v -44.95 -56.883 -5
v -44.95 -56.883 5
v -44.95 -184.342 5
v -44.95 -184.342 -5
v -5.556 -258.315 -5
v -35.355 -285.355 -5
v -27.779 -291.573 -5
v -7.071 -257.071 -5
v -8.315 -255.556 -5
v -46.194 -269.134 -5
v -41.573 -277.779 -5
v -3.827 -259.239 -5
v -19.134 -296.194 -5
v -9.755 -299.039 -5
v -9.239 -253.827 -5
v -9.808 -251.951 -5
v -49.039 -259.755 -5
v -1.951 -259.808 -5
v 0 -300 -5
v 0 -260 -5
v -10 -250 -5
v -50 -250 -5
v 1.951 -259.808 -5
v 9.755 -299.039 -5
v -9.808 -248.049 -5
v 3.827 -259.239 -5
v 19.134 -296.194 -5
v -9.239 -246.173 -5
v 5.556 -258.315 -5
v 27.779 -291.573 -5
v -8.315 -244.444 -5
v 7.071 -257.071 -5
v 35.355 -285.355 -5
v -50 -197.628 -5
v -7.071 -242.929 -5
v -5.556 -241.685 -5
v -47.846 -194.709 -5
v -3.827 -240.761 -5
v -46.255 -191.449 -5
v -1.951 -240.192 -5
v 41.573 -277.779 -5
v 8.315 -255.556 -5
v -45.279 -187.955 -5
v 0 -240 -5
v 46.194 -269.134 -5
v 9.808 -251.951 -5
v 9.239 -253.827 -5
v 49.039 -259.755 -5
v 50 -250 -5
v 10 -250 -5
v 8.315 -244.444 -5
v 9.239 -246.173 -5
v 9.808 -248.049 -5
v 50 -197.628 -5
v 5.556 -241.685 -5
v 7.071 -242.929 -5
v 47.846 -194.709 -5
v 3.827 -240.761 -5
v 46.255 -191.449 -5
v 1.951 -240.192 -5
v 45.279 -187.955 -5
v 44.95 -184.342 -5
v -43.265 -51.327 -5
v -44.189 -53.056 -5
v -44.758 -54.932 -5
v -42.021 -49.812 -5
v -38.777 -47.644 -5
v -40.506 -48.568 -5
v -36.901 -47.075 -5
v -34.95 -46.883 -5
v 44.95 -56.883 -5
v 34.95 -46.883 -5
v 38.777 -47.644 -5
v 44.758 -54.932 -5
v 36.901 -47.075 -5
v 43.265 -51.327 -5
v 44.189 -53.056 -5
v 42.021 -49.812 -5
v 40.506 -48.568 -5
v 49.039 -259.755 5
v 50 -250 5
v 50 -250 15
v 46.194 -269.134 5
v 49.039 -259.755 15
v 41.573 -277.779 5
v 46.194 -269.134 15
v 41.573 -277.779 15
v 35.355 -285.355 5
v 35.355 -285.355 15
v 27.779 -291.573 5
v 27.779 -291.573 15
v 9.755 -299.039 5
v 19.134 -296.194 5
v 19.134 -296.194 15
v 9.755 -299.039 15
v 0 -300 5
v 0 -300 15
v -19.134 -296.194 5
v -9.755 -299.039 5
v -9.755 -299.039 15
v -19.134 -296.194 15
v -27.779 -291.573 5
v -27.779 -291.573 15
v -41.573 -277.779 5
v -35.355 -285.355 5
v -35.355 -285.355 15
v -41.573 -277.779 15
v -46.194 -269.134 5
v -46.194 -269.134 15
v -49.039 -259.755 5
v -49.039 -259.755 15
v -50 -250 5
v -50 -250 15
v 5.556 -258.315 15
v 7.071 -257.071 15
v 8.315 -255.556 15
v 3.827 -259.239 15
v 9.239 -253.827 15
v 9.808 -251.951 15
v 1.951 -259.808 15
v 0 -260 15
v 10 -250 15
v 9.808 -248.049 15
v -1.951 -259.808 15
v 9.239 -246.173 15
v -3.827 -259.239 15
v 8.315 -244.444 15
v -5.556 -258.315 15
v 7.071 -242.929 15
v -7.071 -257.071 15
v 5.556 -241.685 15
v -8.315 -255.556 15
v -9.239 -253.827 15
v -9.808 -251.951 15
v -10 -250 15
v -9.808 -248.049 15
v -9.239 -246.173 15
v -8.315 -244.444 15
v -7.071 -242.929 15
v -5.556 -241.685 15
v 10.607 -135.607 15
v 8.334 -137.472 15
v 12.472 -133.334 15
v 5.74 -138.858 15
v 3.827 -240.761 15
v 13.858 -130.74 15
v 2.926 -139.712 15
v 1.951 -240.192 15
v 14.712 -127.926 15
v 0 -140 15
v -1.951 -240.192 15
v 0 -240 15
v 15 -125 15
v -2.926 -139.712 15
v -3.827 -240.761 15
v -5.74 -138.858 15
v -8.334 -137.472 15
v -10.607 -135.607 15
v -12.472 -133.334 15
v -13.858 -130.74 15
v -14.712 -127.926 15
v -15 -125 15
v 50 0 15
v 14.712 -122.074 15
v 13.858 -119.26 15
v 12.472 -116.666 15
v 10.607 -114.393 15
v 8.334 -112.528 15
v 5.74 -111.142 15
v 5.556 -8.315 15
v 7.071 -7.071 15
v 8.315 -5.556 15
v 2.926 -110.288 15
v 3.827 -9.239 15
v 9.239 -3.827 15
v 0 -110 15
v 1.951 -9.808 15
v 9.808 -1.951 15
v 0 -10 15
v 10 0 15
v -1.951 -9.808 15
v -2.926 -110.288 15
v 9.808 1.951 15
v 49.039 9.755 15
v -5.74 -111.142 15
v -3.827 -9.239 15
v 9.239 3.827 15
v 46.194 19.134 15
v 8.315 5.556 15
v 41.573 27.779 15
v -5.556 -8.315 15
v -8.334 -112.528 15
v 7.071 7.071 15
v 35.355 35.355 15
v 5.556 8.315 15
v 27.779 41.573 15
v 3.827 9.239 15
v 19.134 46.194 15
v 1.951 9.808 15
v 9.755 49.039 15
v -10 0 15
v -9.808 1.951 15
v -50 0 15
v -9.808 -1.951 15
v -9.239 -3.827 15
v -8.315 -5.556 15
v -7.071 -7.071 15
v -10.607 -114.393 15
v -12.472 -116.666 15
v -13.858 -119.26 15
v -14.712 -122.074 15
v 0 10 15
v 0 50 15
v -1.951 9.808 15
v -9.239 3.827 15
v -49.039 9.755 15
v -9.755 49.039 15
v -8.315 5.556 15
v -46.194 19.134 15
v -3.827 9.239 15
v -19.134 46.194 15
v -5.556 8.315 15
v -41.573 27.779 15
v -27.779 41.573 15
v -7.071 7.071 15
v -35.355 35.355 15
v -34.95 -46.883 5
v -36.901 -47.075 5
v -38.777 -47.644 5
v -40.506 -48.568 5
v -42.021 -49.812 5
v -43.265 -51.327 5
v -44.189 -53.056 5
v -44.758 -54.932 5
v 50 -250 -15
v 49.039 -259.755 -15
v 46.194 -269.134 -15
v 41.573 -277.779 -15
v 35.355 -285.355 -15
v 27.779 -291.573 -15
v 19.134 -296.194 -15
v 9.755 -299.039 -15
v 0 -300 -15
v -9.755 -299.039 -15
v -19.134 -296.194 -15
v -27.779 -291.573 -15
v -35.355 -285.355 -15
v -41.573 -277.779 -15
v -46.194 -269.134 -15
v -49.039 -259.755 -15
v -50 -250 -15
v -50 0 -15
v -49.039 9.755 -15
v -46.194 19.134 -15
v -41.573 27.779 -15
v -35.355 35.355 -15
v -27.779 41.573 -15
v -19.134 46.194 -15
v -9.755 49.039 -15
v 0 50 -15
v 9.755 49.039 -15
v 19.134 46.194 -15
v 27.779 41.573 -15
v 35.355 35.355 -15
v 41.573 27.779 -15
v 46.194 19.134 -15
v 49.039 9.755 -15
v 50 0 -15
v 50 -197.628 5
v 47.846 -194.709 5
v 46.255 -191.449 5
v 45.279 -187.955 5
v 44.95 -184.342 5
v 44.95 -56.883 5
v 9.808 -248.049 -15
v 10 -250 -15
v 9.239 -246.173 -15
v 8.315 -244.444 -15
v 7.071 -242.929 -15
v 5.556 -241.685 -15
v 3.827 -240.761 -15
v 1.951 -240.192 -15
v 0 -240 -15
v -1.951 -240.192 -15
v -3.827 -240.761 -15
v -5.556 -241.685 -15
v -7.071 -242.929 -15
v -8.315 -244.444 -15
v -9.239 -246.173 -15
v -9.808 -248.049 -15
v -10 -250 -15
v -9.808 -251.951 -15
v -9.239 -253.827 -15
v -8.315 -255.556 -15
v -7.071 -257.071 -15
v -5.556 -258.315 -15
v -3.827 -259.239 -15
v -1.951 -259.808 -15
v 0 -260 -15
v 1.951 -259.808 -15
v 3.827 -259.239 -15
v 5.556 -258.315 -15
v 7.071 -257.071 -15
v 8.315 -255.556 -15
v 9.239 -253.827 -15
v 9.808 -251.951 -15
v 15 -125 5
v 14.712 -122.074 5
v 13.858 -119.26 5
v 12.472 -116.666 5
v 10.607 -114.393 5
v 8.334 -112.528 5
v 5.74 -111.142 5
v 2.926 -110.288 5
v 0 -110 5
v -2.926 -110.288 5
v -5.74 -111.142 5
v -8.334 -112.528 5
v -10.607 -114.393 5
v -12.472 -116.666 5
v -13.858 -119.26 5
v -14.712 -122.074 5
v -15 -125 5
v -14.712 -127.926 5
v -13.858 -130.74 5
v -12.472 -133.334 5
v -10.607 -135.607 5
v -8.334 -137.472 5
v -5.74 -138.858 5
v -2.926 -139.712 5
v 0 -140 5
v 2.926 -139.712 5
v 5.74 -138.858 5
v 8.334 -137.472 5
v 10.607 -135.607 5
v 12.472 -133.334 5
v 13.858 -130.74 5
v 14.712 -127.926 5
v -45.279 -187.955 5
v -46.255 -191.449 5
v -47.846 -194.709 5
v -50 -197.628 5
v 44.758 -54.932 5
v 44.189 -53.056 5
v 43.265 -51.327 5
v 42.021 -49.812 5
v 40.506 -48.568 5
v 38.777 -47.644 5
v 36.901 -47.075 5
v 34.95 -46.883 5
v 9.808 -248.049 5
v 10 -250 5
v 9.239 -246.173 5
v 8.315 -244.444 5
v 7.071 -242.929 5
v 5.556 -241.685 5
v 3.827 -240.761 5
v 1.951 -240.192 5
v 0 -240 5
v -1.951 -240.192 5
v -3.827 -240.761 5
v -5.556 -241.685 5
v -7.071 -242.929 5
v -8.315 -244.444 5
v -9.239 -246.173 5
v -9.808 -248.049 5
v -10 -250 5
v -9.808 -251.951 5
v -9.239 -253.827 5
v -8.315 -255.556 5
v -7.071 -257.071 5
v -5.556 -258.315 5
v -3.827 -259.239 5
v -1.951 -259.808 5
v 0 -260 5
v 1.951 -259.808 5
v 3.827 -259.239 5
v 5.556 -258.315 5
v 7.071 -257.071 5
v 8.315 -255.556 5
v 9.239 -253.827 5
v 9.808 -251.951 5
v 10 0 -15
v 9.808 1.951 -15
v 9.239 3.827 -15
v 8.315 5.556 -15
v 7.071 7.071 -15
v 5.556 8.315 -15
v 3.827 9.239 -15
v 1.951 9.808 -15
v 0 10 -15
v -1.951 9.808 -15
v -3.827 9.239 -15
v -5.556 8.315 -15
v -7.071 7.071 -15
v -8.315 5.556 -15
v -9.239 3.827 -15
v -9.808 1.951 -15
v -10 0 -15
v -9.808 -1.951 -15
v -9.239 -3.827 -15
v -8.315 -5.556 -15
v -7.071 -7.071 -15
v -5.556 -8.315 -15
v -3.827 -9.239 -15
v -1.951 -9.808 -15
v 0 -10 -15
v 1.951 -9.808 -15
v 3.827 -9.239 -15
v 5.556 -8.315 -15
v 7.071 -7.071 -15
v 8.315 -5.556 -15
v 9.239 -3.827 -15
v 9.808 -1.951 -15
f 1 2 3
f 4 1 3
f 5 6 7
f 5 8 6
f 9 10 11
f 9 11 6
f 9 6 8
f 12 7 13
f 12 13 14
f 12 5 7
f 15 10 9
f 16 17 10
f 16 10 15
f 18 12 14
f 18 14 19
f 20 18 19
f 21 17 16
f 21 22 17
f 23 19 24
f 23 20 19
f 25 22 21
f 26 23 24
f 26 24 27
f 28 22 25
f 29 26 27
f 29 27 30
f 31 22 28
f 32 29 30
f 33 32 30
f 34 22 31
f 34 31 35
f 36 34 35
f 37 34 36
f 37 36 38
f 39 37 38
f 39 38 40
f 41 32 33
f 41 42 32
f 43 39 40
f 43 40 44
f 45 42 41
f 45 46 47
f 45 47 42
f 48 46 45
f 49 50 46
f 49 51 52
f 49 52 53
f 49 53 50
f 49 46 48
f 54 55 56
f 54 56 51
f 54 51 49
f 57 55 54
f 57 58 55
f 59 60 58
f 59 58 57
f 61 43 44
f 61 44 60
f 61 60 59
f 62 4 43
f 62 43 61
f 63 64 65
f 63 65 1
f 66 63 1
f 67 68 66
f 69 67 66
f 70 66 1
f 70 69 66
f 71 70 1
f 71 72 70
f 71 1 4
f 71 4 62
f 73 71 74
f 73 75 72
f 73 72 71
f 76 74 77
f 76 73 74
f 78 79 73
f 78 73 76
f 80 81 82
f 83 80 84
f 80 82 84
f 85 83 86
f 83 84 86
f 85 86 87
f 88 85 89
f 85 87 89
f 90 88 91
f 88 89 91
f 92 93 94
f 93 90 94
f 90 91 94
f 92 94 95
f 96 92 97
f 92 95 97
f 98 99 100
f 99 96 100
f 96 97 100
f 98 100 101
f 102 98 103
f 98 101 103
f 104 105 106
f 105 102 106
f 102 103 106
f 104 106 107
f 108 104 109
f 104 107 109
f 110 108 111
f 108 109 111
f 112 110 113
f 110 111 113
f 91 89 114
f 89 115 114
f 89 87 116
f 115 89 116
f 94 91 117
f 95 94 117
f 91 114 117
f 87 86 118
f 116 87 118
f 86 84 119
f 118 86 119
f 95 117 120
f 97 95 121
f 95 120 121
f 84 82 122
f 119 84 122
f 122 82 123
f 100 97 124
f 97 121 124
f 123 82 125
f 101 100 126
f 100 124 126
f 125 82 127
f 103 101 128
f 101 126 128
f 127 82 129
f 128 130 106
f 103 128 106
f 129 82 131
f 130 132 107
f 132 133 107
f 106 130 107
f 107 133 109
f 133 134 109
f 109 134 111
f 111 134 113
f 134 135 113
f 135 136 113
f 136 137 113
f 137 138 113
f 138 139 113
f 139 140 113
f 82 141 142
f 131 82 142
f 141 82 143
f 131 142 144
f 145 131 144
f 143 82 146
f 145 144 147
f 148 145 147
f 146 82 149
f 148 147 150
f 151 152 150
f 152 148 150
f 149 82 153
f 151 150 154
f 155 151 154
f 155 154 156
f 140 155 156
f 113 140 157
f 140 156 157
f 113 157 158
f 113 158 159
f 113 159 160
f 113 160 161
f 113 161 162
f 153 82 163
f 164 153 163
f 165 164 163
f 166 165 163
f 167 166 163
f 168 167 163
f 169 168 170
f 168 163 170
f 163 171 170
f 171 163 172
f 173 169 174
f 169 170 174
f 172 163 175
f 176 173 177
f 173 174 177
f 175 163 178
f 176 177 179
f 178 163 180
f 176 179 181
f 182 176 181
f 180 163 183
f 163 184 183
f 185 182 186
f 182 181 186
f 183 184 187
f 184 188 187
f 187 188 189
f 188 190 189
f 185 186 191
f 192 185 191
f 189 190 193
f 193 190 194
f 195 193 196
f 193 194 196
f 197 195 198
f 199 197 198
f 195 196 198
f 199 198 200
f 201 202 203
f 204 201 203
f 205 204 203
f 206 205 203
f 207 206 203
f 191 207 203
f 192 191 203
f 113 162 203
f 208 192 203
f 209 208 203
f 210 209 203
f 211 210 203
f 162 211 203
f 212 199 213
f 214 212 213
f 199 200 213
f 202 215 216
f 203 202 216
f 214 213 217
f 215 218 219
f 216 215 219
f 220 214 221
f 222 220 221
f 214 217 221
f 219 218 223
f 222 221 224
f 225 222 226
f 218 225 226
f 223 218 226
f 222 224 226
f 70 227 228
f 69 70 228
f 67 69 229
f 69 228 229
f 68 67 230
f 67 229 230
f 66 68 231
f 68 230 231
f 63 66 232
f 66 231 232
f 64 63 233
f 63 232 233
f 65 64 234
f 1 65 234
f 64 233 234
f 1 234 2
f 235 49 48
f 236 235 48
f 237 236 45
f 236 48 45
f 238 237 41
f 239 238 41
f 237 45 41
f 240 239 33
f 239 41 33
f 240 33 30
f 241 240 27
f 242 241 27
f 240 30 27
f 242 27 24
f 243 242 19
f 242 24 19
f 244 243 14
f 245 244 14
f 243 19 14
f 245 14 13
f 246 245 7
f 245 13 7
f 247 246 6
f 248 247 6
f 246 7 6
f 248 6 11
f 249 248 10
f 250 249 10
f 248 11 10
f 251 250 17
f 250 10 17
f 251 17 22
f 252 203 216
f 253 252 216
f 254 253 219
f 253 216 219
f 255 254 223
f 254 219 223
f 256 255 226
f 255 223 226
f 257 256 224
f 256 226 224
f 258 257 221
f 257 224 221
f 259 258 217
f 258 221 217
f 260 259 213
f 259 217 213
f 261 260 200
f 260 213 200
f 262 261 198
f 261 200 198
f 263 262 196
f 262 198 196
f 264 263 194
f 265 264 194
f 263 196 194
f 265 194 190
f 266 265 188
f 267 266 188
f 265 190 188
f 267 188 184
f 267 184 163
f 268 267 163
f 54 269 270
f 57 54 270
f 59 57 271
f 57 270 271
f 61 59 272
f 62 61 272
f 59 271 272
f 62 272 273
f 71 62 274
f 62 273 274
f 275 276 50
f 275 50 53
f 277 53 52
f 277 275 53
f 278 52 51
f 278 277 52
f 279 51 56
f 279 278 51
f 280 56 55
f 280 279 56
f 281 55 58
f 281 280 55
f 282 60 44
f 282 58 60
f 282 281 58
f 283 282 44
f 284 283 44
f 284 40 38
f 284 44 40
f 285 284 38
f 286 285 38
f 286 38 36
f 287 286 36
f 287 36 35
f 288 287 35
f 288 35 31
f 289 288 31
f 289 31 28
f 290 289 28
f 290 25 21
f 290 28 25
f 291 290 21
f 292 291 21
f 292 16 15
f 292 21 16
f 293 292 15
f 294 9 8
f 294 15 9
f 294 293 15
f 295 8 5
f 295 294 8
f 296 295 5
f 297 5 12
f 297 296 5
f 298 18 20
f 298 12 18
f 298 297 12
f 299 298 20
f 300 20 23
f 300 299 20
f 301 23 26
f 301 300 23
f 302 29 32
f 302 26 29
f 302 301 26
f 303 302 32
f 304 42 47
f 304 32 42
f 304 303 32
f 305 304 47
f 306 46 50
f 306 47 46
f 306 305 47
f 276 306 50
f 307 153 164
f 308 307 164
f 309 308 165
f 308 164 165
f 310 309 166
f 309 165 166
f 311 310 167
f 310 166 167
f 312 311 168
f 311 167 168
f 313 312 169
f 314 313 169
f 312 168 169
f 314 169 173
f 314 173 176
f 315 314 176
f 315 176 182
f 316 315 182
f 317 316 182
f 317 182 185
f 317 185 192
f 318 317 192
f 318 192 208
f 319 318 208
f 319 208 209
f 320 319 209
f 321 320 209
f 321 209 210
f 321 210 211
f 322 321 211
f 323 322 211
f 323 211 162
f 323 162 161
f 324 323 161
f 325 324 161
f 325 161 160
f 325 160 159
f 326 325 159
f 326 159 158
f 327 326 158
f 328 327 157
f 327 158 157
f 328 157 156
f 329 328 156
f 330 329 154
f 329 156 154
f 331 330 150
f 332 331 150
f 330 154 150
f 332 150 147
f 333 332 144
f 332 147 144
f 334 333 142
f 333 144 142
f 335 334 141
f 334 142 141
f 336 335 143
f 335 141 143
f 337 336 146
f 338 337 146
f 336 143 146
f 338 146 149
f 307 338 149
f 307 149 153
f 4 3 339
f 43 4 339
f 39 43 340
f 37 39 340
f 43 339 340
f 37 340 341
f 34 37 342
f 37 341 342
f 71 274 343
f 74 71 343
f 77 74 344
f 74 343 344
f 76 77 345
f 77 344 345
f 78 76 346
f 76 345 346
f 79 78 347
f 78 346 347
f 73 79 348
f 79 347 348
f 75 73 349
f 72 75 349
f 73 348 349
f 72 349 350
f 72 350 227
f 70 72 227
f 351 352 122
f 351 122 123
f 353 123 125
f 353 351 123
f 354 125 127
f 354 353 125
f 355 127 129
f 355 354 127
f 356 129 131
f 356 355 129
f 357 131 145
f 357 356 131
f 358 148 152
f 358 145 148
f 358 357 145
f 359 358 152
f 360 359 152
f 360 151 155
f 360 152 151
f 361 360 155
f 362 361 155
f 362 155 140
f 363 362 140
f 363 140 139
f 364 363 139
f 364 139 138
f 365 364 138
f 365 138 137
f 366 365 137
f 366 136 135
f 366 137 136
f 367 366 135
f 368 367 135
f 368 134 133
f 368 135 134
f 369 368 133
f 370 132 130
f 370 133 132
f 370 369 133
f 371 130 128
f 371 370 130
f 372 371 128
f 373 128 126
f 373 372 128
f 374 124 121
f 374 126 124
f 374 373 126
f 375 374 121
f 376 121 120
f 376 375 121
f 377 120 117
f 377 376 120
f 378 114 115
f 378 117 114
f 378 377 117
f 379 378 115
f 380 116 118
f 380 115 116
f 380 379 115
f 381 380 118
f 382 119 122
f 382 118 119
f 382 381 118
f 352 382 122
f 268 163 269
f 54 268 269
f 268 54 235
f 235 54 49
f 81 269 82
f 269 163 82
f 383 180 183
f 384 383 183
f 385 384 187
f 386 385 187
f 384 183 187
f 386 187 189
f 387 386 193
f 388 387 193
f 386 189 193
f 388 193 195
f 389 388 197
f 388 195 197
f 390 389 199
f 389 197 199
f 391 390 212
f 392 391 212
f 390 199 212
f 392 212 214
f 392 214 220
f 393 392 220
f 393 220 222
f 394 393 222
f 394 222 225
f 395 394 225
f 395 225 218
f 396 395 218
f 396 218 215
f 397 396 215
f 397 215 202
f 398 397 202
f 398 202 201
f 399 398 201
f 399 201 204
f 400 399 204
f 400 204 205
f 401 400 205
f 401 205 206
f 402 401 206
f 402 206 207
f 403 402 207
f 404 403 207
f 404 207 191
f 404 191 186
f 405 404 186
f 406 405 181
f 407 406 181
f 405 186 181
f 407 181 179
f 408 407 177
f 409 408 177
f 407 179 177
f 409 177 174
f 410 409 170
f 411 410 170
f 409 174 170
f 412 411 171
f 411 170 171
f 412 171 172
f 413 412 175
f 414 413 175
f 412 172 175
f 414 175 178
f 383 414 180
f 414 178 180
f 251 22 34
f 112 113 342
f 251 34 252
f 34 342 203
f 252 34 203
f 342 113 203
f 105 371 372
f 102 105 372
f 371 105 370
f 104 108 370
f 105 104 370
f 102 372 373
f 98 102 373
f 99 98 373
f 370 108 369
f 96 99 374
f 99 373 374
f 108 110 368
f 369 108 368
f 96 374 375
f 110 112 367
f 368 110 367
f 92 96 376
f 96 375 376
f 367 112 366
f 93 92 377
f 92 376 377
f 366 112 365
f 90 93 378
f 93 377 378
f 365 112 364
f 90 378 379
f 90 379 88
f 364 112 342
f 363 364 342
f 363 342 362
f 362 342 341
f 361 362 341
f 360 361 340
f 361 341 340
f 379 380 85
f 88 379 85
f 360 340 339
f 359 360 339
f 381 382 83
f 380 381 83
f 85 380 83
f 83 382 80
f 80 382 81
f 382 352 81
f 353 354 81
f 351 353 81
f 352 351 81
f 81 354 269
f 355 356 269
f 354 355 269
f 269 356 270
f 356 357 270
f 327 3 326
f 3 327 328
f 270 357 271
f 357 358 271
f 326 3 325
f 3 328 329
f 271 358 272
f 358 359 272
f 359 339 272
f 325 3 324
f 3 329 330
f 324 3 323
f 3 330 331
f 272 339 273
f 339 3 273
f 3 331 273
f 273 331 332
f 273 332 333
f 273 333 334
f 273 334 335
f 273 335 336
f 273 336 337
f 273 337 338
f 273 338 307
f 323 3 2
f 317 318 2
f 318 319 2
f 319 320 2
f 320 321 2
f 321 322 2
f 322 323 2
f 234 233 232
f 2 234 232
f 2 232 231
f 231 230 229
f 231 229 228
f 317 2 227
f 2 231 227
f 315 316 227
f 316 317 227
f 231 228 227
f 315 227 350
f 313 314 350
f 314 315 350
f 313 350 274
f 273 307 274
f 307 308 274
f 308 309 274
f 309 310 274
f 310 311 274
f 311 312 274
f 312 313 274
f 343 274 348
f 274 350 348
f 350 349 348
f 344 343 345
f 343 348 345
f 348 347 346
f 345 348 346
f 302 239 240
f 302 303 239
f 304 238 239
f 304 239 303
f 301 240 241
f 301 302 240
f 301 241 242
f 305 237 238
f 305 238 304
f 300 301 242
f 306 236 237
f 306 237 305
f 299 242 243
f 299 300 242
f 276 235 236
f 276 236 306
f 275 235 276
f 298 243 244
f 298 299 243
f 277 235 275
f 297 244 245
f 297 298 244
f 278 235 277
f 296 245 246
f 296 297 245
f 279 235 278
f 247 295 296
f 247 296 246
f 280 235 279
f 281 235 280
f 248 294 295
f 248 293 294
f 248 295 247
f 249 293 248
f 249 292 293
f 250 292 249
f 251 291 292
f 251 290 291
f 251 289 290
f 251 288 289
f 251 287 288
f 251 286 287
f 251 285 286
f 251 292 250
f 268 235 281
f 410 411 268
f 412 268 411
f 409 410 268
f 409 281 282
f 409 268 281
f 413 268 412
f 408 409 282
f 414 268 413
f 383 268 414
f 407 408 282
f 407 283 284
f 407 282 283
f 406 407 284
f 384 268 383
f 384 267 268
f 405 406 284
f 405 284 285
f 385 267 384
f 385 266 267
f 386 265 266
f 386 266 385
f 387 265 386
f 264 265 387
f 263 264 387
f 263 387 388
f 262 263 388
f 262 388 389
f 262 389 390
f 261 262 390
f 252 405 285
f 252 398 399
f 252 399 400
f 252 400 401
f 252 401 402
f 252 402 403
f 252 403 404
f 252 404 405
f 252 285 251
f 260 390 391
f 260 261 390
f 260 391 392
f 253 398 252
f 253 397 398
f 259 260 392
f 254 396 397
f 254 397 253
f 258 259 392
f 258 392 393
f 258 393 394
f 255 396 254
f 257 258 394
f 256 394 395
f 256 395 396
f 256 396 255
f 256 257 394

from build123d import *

# Parameters (mm, degrees)
BOSS_EXTRU_2_DEPTH           = 15
ENL_V_MAT_EXTRU_1_DEPTH      = 5
ESQUISSE3_R                  = 10
ENL_V_MAT_EXTRU_2_DEPTH      = 306.614135799
ESQUISSE5_R                  = 15
ENL_V_MAT_EXTRU_3_DEPTH      = 15
ENL_V_MAT_EXTRU_4_DEPTH      = 210
ENL_V_MAT_EXTRU_4_DEPTH_BACK = 305.795013083
ESQUISSE4_R                  = 10


with BuildPart() as part:
    # Esquisse1 → Boss.-Extru.2 (new, symmetric)
    with BuildSketch(Plane.XY):
        with BuildLine():
            Line((50, 0), (50, -250))
            ThreePointArc((50, -250), (0, -300), (-50, -250))
            Line((-50, -250), (-50, 0))
            ThreePointArc((-50, 0), (0, 50), (50, 0))
        make_face()
    extrude(amount=BOSS_EXTRU_2_DEPTH, both=True)

    # Esquisse2 → Enlèv. mat.-Extru.1 (cut, symmetric)
    with BuildSketch(Plane.XY):
        with BuildLine():
            Line((44.95, -184.342455173), (44.95, -56.882832679))
            ThreePointArc((44.95, -56.882832679), (42.021067812, -49.811764867), (34.95, -46.882832679))
            Line((34.95, -46.882832679), (-34.95, -46.882832679))
            ThreePointArc((-34.95, -46.882832679), (-42.021067812, -49.811764867), (-44.95, -56.882832679))
            Line((-44.95, -56.882832679), (-44.95, -184.342455173))
            ThreePointArc((-44.95, -184.342455173), (-47.390043652, -193.91574787), (-54.114793306, -201.153115359))
            Line((-54.114793306, -201.153115359), (-50, -198.500950871))
            Line((-50, -198.500950871), (-50, -250))
            ThreePointArc((-50, -250), (0, -300), (50, -250))
            Line((50, -250), (50, -198.500950871))
            Line((50, -198.500950871), (54.114793306, -201.153115359))
            ThreePointArc((54.114793306, -201.153115359), (47.390043652, -193.91574787), (44.95, -184.342455173))
        make_face()
    extrude(amount=ENL_V_MAT_EXTRU_1_DEPTH, both=True, mode=Mode.SUBTRACT)

    # Esquisse3 → Enlèv. mat.-Extru.2 (cut, through all)
    with BuildSketch(Plane.XY.offset(15)):
        Circle(ESQUISSE3_R)
    extrude(amount=-ENL_V_MAT_EXTRU_2_DEPTH, mode=Mode.SUBTRACT)

    # Esquisse5 → Enlèv. mat.-Extru.3 (cut)
    with BuildSketch(Plane.XY.offset(15)):
        with Locations((0, -125)):
            Circle(ESQUISSE5_R)
    extrude(amount=-ENL_V_MAT_EXTRU_3_DEPTH, mode=Mode.SUBTRACT)

    # Esquisse4 → Enlèv. mat.-Extru.4 (cut, two sides: drawn at the far end of the back side and taken through both)
    with BuildSketch(Plane.XY.offset(-5).offset(-ENL_V_MAT_EXTRU_4_DEPTH_BACK)):
        with Locations((0, -250)):
            Circle(ESQUISSE4_R)
    extrude(amount=ENL_V_MAT_EXTRU_4_DEPTH + ENL_V_MAT_EXTRU_4_DEPTH_BACK, mode=Mode.SUBTRACT)


solid = part.part
